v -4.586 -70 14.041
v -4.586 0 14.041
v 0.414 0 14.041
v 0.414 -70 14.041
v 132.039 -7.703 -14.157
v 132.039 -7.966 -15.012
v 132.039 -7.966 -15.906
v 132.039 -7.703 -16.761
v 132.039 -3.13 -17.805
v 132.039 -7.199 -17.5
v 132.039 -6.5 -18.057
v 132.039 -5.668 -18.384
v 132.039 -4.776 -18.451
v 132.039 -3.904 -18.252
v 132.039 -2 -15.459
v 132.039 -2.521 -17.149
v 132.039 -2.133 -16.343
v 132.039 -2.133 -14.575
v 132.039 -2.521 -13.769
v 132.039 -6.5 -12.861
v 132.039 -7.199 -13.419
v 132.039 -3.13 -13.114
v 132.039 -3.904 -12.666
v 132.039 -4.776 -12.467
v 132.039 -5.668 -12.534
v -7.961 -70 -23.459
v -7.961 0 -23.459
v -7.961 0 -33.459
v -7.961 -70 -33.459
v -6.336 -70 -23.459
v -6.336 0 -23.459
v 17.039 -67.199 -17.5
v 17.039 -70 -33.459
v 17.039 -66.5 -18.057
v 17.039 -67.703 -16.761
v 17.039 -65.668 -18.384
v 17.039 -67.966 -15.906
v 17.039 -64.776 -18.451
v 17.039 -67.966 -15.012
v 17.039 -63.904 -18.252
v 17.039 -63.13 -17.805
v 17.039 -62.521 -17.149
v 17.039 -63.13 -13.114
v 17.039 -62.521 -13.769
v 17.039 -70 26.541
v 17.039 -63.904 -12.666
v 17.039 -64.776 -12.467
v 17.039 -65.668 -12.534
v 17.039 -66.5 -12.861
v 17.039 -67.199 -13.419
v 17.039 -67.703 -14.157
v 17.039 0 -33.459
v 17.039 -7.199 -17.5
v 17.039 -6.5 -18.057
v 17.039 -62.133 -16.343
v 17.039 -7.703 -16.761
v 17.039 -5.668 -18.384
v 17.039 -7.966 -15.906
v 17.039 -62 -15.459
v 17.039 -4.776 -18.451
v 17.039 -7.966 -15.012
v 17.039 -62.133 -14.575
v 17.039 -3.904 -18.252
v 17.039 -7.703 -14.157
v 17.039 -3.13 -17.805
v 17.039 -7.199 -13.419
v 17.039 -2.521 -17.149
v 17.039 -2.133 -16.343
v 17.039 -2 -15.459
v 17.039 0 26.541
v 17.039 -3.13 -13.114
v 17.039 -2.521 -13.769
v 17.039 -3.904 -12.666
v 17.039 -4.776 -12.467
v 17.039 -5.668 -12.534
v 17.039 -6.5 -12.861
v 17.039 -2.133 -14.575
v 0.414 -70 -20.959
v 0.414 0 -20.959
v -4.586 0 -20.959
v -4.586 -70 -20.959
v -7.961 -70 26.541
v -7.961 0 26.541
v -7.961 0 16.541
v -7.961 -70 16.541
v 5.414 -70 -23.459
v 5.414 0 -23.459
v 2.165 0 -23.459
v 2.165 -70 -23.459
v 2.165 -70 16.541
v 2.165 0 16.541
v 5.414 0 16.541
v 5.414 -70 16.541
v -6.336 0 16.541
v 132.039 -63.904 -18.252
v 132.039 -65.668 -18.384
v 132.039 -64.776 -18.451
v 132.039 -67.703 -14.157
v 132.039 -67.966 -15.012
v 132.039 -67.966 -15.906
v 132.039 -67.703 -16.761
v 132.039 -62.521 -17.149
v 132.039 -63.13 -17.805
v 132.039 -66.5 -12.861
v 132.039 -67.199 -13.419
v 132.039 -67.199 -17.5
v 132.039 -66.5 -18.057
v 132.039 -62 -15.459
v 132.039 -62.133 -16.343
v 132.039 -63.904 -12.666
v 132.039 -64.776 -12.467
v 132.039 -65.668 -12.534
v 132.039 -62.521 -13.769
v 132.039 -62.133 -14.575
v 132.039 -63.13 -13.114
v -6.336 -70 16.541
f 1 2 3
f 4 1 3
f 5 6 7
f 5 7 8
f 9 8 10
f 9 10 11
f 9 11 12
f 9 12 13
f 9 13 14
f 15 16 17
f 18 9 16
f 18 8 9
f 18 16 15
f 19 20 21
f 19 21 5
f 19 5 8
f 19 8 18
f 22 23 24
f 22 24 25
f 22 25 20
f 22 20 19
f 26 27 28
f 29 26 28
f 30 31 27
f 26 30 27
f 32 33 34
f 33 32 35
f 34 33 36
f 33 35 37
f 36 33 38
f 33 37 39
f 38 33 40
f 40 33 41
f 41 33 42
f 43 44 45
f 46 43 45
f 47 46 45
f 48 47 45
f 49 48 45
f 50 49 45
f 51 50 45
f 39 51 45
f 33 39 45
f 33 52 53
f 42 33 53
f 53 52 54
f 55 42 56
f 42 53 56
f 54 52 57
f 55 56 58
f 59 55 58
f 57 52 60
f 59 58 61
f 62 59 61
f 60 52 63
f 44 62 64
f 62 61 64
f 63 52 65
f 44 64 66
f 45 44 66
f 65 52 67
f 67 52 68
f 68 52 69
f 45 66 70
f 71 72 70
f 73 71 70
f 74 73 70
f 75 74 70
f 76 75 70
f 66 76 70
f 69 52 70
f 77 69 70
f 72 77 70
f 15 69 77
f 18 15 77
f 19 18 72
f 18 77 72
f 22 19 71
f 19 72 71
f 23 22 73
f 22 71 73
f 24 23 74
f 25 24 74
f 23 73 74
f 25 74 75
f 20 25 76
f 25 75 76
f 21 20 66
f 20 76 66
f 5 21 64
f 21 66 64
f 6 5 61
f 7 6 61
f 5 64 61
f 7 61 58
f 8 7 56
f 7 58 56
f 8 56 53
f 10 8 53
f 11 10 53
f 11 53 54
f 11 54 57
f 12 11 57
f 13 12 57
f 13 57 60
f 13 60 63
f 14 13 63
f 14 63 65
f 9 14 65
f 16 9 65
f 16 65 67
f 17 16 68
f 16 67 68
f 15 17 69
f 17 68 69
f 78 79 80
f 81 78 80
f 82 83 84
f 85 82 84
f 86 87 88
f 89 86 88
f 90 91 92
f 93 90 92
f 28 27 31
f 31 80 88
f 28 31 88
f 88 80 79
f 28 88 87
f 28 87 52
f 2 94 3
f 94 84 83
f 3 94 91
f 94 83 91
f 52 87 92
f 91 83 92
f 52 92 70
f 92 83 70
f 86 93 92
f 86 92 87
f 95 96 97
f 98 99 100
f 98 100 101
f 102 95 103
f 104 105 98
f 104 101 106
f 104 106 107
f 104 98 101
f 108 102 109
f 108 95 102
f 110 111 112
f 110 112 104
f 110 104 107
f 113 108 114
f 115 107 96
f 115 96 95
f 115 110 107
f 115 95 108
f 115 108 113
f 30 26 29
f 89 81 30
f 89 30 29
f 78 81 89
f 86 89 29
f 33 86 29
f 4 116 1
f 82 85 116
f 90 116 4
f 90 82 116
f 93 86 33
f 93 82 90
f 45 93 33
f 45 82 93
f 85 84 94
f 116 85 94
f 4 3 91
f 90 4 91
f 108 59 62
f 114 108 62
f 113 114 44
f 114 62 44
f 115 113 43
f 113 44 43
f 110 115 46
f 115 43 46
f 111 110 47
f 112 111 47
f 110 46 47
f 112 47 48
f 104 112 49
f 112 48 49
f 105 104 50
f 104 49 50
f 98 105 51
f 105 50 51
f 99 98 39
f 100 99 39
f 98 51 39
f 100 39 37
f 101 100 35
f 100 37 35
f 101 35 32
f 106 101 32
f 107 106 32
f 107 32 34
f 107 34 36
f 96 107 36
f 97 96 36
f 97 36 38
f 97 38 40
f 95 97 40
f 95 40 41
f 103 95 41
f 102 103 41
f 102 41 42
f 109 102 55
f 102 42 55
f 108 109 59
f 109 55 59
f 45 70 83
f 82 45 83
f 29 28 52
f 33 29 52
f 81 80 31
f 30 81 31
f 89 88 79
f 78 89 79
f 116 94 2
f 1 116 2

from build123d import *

# Parameters (mm, degrees)
F1_DEPTH = 70
F2_R     = 3
F3_DEPTH = 115


with BuildPart() as f1:
    # F0 (on Front) → F1 (new body)
    with BuildSketch(Plane.XZ):
        Polygon((-7.960861, 26.540911), (-7.960861, 16.540911), (-6.33612, 16.540911), (-4.585601, 14.040911), (0.414399, 14.040911), (2.164918, 16.540911), (5.414399, 16.540911), (5.414399, -23.459089), (2.164918, -23.459089), (0.414399, -20.959089), (-4.585601, -20.959089), (-6.33612, -23.459089), (-7.960861, -23.459089), (-7.960861, -33.459089), (17.039139, -33.459089), (17.039139, 26.540911), align=None)
    extrude(amount=F1_DEPTH)

    # F2 (on face) → F3 (join)
    with BuildSketch(Plane.YZ.offset(17.039139)):
        with Locations((-65, -15.459089)):
            Circle(F2_R)
        with Locations((-5, -15.459089)):
            Circle(F2_R)
    extrude(amount=F3_DEPTH)


solid = f1.part
